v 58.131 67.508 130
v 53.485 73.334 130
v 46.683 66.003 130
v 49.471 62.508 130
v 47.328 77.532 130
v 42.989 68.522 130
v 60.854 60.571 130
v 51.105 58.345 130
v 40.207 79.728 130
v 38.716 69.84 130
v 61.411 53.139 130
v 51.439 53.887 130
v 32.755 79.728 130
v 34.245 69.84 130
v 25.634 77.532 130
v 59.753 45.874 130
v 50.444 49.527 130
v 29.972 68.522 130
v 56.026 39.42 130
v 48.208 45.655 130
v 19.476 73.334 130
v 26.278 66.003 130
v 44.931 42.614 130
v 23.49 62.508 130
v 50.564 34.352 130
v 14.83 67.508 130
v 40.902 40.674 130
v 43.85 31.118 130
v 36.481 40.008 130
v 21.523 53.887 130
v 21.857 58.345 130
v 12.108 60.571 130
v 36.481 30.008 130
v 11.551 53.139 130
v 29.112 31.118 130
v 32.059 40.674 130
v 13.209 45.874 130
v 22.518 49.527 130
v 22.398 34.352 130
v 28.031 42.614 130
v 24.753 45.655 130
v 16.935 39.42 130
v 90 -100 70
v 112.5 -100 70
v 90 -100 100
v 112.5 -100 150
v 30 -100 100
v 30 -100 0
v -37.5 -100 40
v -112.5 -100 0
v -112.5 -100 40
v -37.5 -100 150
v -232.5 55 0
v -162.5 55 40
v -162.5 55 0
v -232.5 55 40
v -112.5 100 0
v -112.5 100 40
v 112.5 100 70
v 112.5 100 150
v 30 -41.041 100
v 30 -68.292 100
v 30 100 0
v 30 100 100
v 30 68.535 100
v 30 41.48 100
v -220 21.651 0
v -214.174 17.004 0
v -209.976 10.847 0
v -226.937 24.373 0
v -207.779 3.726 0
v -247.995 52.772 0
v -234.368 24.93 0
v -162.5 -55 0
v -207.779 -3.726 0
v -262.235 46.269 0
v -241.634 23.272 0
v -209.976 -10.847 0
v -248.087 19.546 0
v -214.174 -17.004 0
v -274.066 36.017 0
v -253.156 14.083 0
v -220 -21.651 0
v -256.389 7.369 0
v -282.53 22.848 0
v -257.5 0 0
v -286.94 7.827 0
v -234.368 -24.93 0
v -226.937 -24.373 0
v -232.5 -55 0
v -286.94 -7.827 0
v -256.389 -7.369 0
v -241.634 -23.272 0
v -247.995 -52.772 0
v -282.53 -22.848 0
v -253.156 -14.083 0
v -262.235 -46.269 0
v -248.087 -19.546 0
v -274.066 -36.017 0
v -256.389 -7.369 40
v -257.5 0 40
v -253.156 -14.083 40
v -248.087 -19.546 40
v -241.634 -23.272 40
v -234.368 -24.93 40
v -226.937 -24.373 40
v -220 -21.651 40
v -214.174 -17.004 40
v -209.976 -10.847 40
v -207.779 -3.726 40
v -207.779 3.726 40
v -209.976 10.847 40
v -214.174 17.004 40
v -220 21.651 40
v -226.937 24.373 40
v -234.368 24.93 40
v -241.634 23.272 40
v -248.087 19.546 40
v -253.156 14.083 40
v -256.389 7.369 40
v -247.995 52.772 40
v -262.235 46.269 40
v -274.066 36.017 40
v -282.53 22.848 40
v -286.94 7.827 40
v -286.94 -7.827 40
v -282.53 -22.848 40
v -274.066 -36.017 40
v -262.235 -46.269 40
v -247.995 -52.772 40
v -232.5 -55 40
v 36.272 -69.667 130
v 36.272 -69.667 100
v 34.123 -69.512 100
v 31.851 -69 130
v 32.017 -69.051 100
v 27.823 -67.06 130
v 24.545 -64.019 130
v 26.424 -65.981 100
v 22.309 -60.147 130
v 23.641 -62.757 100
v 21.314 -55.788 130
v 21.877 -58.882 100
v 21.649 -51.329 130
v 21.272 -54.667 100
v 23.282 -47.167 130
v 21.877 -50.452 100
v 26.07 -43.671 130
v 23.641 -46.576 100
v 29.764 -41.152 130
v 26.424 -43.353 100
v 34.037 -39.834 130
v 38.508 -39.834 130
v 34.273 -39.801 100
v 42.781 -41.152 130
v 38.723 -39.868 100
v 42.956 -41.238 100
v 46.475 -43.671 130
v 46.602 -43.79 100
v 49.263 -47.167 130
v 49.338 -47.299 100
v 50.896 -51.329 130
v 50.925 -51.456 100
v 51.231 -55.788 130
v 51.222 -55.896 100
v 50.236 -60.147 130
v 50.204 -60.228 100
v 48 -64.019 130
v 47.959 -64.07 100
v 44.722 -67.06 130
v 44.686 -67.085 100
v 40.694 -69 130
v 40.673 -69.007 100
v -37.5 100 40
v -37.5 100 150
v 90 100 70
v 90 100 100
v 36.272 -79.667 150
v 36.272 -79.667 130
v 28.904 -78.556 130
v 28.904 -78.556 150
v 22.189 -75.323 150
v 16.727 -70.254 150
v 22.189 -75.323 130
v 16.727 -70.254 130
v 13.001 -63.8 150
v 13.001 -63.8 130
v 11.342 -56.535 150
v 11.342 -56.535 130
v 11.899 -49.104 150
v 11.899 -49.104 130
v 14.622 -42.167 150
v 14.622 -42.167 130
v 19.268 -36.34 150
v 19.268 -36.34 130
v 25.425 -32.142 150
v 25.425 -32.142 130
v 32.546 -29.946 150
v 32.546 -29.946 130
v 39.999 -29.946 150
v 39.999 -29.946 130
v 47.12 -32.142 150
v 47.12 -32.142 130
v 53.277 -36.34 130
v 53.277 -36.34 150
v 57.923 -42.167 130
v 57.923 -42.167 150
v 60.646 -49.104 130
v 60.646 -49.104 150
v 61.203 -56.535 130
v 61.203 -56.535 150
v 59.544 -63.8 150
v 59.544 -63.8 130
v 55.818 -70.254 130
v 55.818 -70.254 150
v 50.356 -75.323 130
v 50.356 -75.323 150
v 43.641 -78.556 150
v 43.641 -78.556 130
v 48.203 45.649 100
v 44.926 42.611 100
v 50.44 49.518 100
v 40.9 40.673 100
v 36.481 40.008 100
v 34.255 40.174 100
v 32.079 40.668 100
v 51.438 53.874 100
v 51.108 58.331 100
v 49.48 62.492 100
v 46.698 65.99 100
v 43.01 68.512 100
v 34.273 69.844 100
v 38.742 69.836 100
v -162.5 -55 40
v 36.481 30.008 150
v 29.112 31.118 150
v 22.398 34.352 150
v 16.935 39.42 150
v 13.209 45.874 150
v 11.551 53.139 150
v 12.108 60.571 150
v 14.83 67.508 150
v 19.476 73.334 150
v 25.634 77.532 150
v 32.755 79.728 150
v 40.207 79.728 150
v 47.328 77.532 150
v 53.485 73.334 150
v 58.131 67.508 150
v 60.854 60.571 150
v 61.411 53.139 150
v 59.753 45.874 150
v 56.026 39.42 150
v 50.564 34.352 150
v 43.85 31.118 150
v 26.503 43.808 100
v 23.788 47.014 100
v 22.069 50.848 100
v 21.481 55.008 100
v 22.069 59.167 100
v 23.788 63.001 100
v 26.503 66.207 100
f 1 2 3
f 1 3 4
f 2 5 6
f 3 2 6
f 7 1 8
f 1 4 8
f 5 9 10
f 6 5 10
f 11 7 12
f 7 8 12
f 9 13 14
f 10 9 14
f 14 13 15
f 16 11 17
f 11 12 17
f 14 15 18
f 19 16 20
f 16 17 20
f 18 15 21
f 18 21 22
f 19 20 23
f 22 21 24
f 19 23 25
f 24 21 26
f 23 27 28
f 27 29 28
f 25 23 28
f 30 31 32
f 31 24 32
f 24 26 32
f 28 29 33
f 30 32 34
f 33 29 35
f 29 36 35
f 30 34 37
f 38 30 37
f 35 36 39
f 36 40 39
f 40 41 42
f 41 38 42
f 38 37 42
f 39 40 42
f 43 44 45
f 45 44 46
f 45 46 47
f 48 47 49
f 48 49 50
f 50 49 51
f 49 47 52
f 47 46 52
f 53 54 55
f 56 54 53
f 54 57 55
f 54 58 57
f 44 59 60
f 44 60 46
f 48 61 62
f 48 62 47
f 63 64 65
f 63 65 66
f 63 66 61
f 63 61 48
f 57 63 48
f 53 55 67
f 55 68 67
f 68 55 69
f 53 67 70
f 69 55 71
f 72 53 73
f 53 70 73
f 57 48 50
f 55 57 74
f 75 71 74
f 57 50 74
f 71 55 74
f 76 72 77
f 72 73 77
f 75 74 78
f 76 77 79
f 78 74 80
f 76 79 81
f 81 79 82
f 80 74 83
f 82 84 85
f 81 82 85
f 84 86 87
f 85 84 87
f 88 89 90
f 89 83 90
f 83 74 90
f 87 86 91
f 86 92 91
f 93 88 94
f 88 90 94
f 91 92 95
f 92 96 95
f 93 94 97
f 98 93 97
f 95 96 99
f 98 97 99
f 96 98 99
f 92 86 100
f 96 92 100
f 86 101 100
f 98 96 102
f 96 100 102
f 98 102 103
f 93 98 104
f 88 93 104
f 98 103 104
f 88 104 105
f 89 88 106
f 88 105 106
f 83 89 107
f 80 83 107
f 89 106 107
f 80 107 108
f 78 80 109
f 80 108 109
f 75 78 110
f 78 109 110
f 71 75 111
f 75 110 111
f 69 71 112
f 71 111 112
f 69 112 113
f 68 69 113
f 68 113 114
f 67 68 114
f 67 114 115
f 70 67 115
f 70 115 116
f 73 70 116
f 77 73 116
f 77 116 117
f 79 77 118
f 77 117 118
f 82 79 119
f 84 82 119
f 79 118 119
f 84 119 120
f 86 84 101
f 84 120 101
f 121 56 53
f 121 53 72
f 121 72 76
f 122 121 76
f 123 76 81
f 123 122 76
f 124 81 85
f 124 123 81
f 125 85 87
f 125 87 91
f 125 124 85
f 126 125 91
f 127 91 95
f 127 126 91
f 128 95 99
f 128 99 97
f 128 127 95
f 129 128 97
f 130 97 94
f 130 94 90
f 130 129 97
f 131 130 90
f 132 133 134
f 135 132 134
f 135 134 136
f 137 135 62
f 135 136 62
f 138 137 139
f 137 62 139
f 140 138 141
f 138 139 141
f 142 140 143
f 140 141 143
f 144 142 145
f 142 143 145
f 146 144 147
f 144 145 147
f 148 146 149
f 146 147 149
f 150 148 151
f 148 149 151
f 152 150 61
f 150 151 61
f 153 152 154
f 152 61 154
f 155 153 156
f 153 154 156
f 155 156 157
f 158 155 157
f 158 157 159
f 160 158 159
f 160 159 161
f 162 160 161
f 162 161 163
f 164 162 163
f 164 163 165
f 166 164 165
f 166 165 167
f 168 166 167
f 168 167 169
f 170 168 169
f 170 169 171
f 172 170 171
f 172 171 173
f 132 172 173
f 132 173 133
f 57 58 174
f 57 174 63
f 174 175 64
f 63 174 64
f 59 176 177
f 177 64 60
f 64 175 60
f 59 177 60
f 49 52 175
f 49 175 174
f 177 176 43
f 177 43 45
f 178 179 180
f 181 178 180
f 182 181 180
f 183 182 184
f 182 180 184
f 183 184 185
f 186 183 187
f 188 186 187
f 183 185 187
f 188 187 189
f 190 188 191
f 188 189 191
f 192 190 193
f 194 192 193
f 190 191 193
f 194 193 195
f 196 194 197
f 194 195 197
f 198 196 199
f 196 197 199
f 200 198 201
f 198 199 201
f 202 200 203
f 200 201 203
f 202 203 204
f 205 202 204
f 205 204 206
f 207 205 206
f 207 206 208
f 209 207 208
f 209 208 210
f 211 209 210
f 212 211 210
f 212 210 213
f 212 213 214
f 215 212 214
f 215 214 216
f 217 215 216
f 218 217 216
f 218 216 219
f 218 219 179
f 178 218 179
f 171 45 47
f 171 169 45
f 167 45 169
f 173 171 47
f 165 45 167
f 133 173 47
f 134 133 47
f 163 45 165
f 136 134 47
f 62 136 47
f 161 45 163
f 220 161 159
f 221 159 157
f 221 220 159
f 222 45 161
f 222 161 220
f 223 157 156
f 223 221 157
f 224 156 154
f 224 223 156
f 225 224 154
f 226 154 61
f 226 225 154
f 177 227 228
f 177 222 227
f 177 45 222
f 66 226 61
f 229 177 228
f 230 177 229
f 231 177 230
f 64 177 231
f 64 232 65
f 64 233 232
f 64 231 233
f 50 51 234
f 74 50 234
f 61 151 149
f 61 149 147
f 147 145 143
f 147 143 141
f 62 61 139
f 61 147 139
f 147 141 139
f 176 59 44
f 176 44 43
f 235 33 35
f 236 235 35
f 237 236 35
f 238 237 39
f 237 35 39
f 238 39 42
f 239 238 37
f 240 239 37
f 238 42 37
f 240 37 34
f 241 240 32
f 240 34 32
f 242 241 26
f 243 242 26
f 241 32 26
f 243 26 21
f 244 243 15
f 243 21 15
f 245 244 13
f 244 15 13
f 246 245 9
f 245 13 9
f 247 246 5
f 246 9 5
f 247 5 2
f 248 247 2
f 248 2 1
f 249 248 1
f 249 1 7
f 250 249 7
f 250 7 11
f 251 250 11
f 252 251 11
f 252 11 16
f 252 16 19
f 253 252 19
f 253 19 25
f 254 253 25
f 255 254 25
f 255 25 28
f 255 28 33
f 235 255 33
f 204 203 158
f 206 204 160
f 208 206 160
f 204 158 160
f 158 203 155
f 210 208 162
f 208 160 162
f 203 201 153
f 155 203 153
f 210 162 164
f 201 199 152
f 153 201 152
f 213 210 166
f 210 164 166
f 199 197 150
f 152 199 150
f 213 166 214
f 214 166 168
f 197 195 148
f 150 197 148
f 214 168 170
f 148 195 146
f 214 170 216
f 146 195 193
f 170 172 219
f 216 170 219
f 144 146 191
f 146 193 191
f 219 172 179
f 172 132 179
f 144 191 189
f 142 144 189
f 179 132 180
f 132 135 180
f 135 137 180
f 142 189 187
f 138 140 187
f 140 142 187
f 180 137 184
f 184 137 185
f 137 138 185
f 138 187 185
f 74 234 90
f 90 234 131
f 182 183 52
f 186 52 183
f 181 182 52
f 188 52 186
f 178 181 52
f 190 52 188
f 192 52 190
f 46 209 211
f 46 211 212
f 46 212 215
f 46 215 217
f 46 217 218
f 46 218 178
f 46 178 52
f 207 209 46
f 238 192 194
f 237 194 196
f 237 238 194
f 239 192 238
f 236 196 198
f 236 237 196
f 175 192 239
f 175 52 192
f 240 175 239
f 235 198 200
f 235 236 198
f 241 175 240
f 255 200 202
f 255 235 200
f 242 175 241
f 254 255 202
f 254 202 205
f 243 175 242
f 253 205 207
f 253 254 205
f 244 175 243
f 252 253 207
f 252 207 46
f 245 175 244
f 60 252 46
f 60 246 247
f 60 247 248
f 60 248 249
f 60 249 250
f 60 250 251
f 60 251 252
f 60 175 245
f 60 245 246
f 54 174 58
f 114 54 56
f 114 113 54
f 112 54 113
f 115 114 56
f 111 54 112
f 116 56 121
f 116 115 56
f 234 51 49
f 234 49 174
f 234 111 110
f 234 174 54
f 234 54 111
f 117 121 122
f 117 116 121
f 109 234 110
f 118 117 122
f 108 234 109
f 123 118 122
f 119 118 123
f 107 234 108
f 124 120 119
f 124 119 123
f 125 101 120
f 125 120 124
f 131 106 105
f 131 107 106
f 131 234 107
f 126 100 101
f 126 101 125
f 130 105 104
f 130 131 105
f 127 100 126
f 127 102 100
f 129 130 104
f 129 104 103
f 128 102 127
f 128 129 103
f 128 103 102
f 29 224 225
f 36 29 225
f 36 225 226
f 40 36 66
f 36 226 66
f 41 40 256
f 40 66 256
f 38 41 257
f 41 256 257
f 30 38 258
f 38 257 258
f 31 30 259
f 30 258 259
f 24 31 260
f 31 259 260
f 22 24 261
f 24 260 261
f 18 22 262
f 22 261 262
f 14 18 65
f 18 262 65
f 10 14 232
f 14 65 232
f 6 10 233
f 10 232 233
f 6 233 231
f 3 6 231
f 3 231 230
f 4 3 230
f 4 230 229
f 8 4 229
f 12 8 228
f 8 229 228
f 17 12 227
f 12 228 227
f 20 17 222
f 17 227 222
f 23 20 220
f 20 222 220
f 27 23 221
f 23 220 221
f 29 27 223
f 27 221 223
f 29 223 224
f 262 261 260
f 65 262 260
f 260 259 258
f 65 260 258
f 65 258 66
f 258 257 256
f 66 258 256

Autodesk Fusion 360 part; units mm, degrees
sketch "Sketch1" plane through (0, 0, 0) normal (0, 0, 1) x (1, 0, 0)
  line L0 (112.5, -100) -> (-112.5, -100)
  line L1 (-112.5, -100) -> (-112.5, 100)
  line L2 (-112.5, 100) -> (112.5, 100)
  line L3 (112.5, 100) -> (112.5, -100)
  line L4 (112.5, -100) -> (-112.5, 100) construction
  line L5 (-112.5, -100) -> (112.5, 100) construction
  line L6 (0, 100) -> (0, -100) construction
  line L7 (-112.5, 0) -> (112.5, 0) construction
  dimension "d1" = 225
  dimension "d2" = 200
extrude "Extrude1" add sketch "Sketch1" along normal blind 150
sketch "Sketch2" plane through (0, 100, 0) normal (0, 1, 0) x (-1, 0, 0)
  line L0 (-112.5, 0) -> (112.5, 0)
  line L1 (112.5, 0) -> (112.5, 150)
  line L2 (112.5, 150) -> (-112.5, 150)
  line L3 (-112.5, 150) -> (-112.5, 0)
  line L4 (112.5, 150) -> (37.5, 150)
  line L5 (37.5, 150) -> (37.5, 40)
  line L6 (37.5, 40) -> (112.5, 40)
  line L7 (112.5, 40) -> (112.5, 150)
  dimension "d5" = 75
sketch "Sketch3" plane through (0, 100, 0) normal (0, 1, 0) x (-1, 0, 0)
extrude "Extrude2" cut sketch "Sketch2" against normal blind 540 contours L1 L2 L4 L5 L6 L7
sketch "Sketch4" plane through (0, 100, 0) normal (0, 1, 0) x (-1, 0, 0)
  line L0 (112.5, 40) -> (37.5, 40)
  line L1 (37.5, 40) -> (37.5, 150)
  line L2 (37.5, 150) -> (-112.5, 150)
  line L3 (-112.5, 150) -> (-112.5, 0)
  line L4 (-112.5, 0) -> (112.5, 0)
  line L5 (112.5, 0) -> (112.5, 40)
sketch "Sketch5" plane through (0, 0, 150) normal (0, 0, 1) x (-1, 0, 0)
  line L0 (37.5, -100) -> (37.5, 100)
  line L1 (37.5, 100) -> (-112.5, 100)
  line L2 (-112.5, 100) -> (-112.5, -100)
  line L3 (-112.5, -100) -> (37.5, -100)
sketch "Sketch6" plane through (0, 100, 0) normal (0, 1, 0) x (-1, 0, 0)
  line L0 (-112.5, 0) -> (-112.5, 70)
  line L1 (-112.5, 70) -> (-90, 70)
  line L2 (-90, 70) -> (-90, 100)
  line L3 (-90, 100) -> (-30, 100)
  line L4 (-30, 100) -> (-30, 0)
  line L5 (-30, 0) -> (-112.5, 0)
  line L6 (37.5, 150) -> (-112.5, 150)
  point P0 (37.5, 150)
  point P1 (37.5, 40)
  point P2 (-112.5, 0)
  dimension "d8" = 50
  dimension "d9" = 80
  dimension "d10" = 110
  dimension "d11" = 150
extrude "Extrude3" cut sketch "Sketch6" against normal blind 375
sketch "Sketch7" plane through (0, 0, 150) normal (0, 0, 1) x (-1, 0, 0)
  line L0 (-37.5, 100) -> (-37.5, -100) construction
  line L1 (-112.7809, 55) -> (35.5051, 55) construction
  line L2 (-110, -55) -> (40, -55) construction
  point P0 (-112.5, 100)
  point P1 (37.5, -100)
  dimension "d14" = 75
  dimension "d15" = 45
  dimension "d16" = 45
sketch "Sketch8" plane through (0, 0, 150) normal (0, 0, 1) x (-1, 0, 0)
  line L0 (-37.5, 100) -> (-37.5, -100)
  point P0 (-112.5, -100)
  dimension "d17" = 75
sketch "Sketch9" plane through (0, 100, 0) normal (0, 1, 0) x (-1, 0, 0)
  point P0 (-112.7809, 150)
  point P1 (37.5, 150)
sketch "Sketch10" plane through (0, 0, 150) normal (0, 0, 1) x (-1, 0, 0)
  line L0 (-111.7438, 55) -> (36.0063, 55)
  line L1 (112.5, 0) -> (-112.3459, 0) construction
  line L2 (40, -55) -> (-112.822, -55) construction
  point P0 (-112.5, 100)
  point P1 (-37.5, 100)
  point P2 (-112.5, 100)
  point P3 (40, -55)
  point P4 (37.5, -100)
  dimension "d19" = 75
  dimension "d20" = 45
  dimension "d21" = 45
sketch "Sketch11" plane through (0, 0, 150) normal (0, 0, 1) x (-1, 0, 0)
hole "Hole1" at (36.2725, -54.6667, 150) direction (0, 0, -1) diameter 30 depth 50 tip angle 180 counterbore diameter 50 counterbore depth 20
hole "Hole2" at (36.4807, 55.0076, 150) direction (0, 0, -1) diameter 30 depth 50 tip angle 180 counterbore diameter 50 counterbore depth 20
sketch "Sketch12" plane through (0, 0, 40) normal (0, 0, 1) x (-1, 0, 0)
  line L0 (112.5, 100) -> (37.5, 100)
  line L1 (37.5, 100) -> (37.5, -100)
  line L2 (37.5, -100) -> (112.5, -100)
  line L3 (112.5, -100) -> (112.5, 100)
sketch "Sketch13" plane through (0, 0, 40) normal (0, 0, 1) x (-1, 0, 0)
sketch "Sketch14" plane through (0, 0, 40) normal (0, 0, 1) x (-1, 0, 0)
sketch "Sketch15" plane through (0, 0, 40) normal (0, 0, 1) x (-1, 0, 0)
sketch "Sketch16" plane through (0, 0, 40) normal (0, 0, 1) x (-1, 0, 0)
  line L0 (112.5, -100) -> (112.5, 100)
  line L1 (112.5, 100) -> (162.5, 100)
  line L2 (162.5, 100) -> (162.5, -100)
  line L3 (162.5, -100) -> (112.5, -100)
  dimension "d40" = 50
  dimension "d41" = 200
  dimension "d42" = 50
extrude "Extrude4" add sketch "Sketch16" against normal blind 40
sketch "Sketch17" plane through (0, 0, 40) normal (0, 0, 1) x (-1, 0, 0)
  line L0 (112.5, 100) -> (37.5, 100)
  line L1 (37.5, 100) -> (37.5, -100)
  line L2 (37.5, -100) -> (112.5, -100)
  line L3 (112.5, -100) -> (162.5, -100)
  line L4 (162.5, -100) -> (162.5, 100)
  line L5 (162.5, 100) -> (112.5, 100)
sketch "Sketch18" plane through (0, 0, 40) normal (0, 0, 1) x (-1, 0, 0)
  line L0 (162.3989, 55) -> (162.5, 55)
  line L1 (162.5, -55) -> (162.485, -55)
  line L2 (162.5, -55) -> (162.5, -100)
  line L3 (162.5, -100) -> (112.5, -100)
  line L4 (162.5, -100) -> (112.5, -100)
  line L5 (112.5, -100) -> (162.5, -55)
  line L6 (112.5, 0) -> (-112.3459, 0)
  line L7 (162.5, 100) -> (112.5, 100)
  line L8 (112.5, 100) -> (162.5, 55)
  line L9 (162.5, 55) -> (162.5, 100)
  point P0 (162.5, -100)
  point P1 (162.5, 100)
  dimension "d45" = 45
  dimension "d46" = 45
  dimension "d47" = 50
  dimension "d48" = 50
extrude "Extrude5" cut sketch "Sketch18" against normal blind 40
sketch "Sketch19" plane through (0, 0, 40) normal (0, 0, 1) x (-1, 0, 0)
  line L0 (162.5, -55) -> (232.5, -55)
  line L1 (162.5, 55) -> (232.5, 55)
  line L2 (162.5, -55) -> (162.5, 55)
  circle A0 centre (232.5, 0) radius 25
  arc A1 (232.5, -55) -> (232.5, 55) centre (232.5, 0) ccw
  line L3 (162.5, -100) -> (162.5, 100)
  point P0 (37.5, 100)
  point P1 (37.5, -100)
  dimension "d51" = 70
  dimension "d52" = 70
  dimension "d53" = 45
  dimension "d54" = 45
  dimension "d55" = 50
extrude "Extrude6" add sketch "Sketch19" against normal blind 40
